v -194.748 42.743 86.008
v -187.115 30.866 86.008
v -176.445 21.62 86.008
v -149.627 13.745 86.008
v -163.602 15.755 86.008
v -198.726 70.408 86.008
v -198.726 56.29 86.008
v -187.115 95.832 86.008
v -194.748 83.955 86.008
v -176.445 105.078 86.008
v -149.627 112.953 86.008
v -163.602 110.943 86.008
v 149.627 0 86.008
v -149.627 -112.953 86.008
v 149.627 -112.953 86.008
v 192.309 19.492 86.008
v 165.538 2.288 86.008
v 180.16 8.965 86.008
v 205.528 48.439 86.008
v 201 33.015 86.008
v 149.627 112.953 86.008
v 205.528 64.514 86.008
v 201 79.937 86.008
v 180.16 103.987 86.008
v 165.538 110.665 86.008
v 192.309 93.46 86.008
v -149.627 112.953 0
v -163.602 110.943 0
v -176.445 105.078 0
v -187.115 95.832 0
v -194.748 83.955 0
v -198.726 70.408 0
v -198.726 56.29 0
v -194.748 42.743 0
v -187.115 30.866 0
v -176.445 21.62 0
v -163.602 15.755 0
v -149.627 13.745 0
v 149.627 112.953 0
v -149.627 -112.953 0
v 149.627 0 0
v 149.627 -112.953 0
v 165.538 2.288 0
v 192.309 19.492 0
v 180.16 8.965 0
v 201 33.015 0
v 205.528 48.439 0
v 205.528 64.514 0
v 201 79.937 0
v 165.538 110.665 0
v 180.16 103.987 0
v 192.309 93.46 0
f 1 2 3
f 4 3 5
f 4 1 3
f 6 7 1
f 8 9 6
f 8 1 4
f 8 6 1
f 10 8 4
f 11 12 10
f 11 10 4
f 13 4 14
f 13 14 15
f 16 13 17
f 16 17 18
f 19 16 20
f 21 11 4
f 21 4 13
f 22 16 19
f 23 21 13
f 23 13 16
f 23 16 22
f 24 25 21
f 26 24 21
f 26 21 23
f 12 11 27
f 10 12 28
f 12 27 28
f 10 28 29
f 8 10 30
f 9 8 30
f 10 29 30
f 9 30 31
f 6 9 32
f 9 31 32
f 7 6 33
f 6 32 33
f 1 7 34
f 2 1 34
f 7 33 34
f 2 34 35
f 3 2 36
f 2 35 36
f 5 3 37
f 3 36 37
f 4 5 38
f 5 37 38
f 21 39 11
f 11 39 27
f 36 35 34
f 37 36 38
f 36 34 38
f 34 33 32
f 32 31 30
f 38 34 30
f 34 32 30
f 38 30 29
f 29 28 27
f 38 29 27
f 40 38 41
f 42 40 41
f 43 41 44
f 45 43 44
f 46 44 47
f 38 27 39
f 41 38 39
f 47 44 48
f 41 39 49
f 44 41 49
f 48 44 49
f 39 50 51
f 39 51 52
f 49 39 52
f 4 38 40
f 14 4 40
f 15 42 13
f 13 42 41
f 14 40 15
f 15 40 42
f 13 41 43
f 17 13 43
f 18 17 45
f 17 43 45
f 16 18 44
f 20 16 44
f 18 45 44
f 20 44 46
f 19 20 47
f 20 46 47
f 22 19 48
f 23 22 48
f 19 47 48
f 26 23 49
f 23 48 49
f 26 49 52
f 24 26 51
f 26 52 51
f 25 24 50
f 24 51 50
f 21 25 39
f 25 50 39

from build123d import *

# Parameters (mm, degrees)
F1_DEPTH = 86.007776


with BuildPart() as f1:
    # F0 (on Top) → F1 (new body)
    with BuildSketch(Plane.XY):
        Polygon((149.626926, 0), (149.626926, 112.95262), (-149.626926, 112.95262), (-149.626926, 13.745412), (-149.626926, -112.95262), (149.626926, -112.95262), align=None)
        with BuildLine():
            Line((-149.626926, 13.745412), (-149.626926, 112.95262))
            ThreePointArc((-149.626926, 112.95262), (-199.230529, 63.349016), (-149.626926, 13.745412))
        make_face()
        with BuildLine():
            ThreePointArc((149.626926, 0), (206.103235, 56.47631), (149.626926, 112.95262))
            Line((149.626926, 112.95262), (149.626926, 0))
        make_face()
    extrude(amount=F1_DEPTH)


solid = f1.part
